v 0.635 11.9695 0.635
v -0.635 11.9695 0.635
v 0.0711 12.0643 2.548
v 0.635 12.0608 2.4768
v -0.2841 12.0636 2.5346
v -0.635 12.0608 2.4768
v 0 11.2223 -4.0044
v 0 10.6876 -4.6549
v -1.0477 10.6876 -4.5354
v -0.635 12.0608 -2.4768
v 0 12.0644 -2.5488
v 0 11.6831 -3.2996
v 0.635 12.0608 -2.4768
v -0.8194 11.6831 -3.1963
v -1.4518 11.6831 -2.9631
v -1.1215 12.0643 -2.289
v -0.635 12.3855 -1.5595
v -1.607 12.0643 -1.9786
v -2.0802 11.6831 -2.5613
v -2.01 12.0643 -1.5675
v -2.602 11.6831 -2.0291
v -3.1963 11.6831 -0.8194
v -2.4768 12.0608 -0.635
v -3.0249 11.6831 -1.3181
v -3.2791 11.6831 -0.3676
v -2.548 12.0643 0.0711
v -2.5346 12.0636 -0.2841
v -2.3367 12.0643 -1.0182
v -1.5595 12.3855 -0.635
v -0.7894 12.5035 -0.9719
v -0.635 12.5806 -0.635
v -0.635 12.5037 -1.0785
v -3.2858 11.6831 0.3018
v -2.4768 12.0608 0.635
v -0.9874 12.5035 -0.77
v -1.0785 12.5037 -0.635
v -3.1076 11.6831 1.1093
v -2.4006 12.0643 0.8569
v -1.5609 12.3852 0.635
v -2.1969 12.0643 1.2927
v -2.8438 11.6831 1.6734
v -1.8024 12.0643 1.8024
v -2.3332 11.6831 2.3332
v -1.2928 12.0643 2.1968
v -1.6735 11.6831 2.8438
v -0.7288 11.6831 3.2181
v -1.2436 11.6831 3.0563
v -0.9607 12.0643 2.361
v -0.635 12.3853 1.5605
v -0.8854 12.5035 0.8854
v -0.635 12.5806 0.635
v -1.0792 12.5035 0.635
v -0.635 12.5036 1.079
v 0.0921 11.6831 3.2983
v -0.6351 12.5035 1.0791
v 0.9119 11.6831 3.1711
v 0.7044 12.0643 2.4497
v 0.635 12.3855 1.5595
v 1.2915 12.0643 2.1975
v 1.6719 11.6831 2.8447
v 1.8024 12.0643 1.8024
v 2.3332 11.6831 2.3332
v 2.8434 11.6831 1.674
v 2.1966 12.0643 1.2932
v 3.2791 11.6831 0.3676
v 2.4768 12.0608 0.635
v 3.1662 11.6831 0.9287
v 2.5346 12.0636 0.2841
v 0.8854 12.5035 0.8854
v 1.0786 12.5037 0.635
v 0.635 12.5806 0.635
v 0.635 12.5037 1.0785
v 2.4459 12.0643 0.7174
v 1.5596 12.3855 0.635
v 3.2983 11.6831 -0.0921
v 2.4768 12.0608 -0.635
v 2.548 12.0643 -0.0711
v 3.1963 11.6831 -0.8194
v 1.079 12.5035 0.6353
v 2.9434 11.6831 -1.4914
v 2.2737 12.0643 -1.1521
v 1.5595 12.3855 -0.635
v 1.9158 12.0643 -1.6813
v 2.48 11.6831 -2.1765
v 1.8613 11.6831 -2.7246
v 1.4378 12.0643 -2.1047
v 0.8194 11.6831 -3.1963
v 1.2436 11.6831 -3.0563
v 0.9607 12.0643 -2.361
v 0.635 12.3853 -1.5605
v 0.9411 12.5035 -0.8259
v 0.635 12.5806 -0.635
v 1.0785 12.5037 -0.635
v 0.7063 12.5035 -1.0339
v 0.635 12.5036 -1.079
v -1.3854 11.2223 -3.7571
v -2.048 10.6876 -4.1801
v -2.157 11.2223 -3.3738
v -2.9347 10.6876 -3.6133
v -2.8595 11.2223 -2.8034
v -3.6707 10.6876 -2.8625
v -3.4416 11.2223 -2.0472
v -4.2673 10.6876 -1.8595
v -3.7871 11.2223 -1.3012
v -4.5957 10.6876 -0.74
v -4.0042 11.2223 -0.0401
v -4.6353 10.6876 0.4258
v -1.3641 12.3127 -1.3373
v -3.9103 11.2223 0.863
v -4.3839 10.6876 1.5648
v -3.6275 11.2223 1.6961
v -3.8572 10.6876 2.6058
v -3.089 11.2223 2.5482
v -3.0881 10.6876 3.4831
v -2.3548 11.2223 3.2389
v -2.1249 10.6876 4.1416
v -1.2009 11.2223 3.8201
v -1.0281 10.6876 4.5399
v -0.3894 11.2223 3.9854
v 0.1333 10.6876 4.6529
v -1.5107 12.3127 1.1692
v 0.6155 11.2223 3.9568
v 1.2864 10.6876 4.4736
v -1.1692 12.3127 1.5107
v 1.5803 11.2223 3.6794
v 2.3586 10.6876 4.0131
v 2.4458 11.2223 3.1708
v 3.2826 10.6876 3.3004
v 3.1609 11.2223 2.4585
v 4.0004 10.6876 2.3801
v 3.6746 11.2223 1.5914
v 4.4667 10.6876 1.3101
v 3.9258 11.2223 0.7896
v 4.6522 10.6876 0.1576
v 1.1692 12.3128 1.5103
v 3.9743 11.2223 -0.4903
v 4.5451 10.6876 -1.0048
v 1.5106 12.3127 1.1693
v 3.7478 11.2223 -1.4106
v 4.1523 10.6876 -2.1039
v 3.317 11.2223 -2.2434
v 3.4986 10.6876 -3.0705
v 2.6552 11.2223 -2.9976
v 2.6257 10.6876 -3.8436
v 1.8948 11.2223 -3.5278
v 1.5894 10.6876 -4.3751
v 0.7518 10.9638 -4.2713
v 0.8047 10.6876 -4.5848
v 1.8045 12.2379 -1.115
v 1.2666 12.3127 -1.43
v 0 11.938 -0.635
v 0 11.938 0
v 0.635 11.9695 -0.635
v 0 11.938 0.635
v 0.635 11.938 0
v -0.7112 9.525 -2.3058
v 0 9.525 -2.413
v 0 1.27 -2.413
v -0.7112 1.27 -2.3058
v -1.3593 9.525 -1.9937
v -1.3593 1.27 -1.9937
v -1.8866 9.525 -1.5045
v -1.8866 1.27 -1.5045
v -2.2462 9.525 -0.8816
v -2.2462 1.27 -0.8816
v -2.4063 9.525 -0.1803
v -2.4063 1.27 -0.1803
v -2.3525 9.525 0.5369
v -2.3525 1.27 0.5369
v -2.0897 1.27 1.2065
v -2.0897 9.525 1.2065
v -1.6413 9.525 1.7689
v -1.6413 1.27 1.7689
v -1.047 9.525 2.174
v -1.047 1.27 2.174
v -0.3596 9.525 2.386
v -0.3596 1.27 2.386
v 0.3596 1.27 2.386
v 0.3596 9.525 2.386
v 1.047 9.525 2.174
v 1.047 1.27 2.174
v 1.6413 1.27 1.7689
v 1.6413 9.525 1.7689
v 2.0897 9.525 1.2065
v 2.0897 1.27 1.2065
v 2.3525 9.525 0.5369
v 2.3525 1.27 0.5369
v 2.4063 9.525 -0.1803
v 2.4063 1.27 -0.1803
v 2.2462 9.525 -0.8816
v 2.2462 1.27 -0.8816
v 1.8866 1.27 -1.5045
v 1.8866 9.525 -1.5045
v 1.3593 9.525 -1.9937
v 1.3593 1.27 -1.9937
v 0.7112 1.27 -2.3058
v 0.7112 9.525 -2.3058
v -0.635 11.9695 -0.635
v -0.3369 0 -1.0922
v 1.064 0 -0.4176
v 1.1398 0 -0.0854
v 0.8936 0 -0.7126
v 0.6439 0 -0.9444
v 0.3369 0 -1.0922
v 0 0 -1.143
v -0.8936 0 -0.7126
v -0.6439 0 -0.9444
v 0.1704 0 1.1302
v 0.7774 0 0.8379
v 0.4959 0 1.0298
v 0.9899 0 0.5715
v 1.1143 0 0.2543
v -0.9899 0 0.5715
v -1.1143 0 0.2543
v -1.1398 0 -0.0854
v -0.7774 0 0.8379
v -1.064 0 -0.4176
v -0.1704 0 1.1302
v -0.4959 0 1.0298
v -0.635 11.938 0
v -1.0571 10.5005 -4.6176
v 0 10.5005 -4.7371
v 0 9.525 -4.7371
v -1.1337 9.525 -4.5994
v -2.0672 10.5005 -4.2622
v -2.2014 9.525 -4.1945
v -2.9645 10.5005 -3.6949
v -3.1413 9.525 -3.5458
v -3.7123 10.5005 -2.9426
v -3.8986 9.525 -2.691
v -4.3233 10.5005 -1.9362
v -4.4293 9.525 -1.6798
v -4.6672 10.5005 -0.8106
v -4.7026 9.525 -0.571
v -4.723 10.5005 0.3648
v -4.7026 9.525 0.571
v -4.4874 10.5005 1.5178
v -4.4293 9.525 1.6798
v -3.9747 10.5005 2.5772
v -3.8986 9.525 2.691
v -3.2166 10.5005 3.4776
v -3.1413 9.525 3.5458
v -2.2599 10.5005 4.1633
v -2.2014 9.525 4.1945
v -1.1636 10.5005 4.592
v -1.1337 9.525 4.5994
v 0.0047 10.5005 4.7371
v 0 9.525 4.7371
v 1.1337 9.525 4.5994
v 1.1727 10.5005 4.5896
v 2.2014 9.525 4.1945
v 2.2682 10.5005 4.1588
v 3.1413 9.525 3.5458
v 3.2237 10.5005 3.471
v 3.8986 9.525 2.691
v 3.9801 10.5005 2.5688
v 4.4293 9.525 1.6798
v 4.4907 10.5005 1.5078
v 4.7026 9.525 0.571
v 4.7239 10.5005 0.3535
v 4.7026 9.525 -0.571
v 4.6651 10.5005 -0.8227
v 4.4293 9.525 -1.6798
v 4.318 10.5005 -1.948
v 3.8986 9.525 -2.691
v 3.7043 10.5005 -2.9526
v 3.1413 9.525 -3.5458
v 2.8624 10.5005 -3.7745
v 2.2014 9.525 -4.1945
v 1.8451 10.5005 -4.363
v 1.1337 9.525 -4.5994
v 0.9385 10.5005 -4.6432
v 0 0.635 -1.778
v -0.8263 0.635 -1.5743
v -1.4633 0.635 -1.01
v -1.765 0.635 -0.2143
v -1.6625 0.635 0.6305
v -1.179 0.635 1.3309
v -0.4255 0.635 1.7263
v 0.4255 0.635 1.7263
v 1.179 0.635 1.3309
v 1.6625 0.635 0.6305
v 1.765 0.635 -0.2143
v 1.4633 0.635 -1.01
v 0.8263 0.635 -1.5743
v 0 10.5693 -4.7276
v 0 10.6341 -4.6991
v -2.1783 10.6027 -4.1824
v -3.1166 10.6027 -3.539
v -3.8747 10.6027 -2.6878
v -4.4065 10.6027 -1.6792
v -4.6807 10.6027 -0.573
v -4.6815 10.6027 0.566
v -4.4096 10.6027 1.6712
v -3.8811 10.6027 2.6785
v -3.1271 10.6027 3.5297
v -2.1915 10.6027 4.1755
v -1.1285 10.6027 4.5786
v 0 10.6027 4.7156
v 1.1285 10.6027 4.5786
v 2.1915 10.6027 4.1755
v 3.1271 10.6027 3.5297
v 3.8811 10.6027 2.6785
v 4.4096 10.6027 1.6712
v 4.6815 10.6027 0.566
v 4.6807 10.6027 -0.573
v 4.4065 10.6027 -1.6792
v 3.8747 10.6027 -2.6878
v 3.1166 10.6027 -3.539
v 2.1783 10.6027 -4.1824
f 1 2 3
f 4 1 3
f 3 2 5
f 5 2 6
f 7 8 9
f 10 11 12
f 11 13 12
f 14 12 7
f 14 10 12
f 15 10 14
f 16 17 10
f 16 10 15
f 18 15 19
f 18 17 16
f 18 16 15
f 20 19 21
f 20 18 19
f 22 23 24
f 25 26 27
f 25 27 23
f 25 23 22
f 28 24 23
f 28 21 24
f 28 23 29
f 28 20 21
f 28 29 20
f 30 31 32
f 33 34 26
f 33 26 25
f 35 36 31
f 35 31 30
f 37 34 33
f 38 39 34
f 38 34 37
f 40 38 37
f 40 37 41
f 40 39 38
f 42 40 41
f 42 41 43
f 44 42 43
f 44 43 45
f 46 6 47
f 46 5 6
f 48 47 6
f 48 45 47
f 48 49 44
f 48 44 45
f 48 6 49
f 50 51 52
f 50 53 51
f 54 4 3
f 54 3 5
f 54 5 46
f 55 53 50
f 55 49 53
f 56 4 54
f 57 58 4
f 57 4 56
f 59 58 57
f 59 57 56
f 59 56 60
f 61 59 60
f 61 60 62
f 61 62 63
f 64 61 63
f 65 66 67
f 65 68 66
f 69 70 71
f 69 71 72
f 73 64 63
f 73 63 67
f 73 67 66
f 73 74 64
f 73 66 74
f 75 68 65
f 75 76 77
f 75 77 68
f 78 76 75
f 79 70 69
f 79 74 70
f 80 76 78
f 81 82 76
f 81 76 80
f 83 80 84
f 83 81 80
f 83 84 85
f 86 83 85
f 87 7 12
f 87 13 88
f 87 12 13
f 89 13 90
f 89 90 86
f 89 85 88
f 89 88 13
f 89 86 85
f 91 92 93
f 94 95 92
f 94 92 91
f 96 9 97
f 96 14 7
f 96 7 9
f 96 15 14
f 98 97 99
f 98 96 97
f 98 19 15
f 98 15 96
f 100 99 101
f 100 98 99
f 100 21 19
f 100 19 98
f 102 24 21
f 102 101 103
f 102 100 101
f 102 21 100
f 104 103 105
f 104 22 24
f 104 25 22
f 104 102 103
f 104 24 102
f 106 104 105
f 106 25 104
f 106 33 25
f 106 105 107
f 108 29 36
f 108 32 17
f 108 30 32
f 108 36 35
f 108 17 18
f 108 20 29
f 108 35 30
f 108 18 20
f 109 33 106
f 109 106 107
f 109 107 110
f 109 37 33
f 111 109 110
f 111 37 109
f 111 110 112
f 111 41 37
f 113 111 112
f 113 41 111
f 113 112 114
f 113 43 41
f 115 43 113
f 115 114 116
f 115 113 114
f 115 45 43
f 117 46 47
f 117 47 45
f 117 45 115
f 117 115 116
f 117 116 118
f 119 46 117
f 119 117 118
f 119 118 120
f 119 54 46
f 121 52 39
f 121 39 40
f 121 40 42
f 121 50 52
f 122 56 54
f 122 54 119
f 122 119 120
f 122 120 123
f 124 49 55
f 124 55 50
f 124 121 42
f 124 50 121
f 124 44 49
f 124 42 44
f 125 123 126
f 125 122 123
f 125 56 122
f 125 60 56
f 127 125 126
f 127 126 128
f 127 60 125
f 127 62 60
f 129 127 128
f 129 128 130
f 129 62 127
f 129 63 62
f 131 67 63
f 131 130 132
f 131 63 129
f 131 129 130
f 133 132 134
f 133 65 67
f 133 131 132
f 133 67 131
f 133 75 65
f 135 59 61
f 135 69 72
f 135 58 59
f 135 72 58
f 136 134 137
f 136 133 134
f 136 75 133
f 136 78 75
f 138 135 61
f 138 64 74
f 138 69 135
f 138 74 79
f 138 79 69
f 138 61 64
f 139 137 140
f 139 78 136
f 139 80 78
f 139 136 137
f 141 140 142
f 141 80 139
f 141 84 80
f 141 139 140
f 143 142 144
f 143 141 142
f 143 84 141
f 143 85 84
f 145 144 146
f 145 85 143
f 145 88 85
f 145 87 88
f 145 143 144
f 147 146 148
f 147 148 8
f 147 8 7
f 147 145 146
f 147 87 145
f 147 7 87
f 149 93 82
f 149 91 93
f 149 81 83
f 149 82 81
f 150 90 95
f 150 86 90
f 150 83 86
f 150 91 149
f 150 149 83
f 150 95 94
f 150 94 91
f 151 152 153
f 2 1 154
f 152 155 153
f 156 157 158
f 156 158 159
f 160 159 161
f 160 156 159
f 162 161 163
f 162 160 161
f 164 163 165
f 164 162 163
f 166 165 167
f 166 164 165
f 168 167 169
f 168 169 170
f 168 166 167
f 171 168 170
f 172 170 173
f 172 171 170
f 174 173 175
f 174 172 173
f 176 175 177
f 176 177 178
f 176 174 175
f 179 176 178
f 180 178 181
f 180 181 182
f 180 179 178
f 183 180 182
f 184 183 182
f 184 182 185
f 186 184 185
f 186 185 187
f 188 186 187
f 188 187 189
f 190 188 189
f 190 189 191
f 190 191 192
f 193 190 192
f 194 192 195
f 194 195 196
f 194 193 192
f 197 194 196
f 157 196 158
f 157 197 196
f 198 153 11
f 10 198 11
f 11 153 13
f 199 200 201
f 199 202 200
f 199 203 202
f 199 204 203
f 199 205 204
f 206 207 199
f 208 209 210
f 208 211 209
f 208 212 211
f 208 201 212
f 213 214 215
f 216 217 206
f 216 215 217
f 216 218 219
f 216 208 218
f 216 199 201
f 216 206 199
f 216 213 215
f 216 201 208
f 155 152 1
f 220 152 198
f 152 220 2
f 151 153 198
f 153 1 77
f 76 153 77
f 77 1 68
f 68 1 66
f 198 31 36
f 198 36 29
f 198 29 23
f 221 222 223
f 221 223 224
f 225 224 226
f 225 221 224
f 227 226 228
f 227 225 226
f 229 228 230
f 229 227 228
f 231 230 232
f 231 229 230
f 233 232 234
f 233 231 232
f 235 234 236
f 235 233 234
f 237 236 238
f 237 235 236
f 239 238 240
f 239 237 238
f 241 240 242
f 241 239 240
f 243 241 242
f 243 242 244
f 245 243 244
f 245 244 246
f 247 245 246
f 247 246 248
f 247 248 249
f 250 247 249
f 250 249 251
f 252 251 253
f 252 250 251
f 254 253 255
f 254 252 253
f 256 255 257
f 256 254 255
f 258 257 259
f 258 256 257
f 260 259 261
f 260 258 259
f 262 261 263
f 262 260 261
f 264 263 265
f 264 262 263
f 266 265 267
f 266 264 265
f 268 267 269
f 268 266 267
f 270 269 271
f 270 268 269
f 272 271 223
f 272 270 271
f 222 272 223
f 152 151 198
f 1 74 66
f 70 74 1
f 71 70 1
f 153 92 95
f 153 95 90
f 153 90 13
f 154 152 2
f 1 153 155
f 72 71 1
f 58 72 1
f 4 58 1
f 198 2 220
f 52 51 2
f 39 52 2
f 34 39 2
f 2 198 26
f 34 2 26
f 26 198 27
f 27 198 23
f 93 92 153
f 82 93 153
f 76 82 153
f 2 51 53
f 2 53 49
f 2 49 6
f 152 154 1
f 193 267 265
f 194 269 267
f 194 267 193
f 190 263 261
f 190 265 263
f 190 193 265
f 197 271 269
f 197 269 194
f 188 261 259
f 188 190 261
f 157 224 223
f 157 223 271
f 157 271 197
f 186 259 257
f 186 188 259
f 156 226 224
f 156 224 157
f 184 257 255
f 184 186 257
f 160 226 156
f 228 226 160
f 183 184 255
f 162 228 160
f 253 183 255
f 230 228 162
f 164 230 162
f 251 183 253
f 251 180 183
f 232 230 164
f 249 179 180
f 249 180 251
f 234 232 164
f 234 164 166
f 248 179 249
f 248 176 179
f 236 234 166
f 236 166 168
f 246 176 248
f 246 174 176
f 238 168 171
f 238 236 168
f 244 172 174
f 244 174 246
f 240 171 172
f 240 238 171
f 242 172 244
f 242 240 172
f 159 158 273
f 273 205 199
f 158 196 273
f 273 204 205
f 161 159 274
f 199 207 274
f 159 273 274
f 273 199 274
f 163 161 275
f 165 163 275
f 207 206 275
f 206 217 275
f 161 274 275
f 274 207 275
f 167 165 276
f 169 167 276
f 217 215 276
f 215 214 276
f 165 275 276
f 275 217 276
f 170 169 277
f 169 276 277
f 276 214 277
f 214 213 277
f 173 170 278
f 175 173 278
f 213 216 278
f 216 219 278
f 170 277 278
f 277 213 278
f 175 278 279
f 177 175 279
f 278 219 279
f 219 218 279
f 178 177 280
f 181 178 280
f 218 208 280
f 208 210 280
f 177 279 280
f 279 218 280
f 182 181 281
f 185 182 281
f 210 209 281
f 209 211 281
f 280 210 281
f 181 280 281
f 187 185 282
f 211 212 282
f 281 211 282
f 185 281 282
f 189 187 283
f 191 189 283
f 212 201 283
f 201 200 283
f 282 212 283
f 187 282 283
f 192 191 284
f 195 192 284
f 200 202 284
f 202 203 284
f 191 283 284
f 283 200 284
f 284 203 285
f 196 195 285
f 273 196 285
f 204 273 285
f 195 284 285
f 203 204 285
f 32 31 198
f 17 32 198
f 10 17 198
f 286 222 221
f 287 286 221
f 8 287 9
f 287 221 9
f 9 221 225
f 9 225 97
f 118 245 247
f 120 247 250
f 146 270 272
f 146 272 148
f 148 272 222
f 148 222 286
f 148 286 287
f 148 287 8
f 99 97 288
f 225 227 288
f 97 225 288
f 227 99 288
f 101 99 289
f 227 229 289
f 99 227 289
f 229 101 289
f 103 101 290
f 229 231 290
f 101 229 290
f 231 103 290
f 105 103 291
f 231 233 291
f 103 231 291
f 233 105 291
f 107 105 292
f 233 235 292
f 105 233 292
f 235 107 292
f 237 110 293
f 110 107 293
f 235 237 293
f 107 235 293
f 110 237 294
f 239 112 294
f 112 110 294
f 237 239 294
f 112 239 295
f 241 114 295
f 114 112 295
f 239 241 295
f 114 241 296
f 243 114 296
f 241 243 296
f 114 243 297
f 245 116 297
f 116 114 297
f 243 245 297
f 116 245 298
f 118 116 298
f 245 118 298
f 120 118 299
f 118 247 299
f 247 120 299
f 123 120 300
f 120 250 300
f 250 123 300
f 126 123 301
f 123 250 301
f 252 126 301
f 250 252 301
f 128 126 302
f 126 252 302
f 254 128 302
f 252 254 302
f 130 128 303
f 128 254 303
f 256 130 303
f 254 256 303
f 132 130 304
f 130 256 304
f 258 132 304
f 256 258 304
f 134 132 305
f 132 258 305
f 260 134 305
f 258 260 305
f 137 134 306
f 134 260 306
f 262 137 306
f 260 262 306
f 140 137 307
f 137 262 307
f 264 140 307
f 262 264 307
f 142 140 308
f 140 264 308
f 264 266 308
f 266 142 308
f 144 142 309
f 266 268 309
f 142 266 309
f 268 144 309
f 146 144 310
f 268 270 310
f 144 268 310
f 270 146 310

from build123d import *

# Parameters (mm, degrees)
BOSS_EXTRUDE1_DEPTH = 0.635
CIRPATTERN1_COUNT   = 4
FILLET1_R           = 0.254
CHAMFER1_SIZE       = 1.27


with BuildPart() as part:
    # Sketch1 → Revolve1 (revolve)
    with BuildSketch(Plane.XY, mode=Mode.PRIVATE) as revolve1_sk:
        with BuildLine():
            Line((0, 0), (2.413, 0))
            Line((2.413, 0), (2.413, 9.525))
            Line((2.413, 9.525), (4.7371, 9.525))
            Line((4.7371, 9.525), (4.7371, 10.611002179))
            ThreePointArc((4.7371, 10.611002179), (2.548848552, 12.064353728), (0, 12.7))
            Line((0, 12.7), (0, 0))
        make_face()
    revolve(revolve1_sk.sketch.rotate(Axis((0, 0, 0), (0, 1, 0)), 90), axis=Axis((0, 0, 0), (0, 1, 0)))

    # Sketch2 → Boss-Extrude1 (cut, symmetric)
    with BuildSketch(Plane.XY):
        with BuildLine():
            Line((0, 12.7), (0, 11.938))
            Line((0, 11.938), (2.548848552, 12.064353728))
            ThreePointArc((2.548848552, 12.064353728), (1.301653808, 12.491363305), (0, 12.7))
        make_face()
    boss_extrude1 = extrude(amount=BOSS_EXTRUDE1_DEPTH, both=True, mode=Mode.SUBTRACT)

    # CirPattern1: Boss-Extrude1 ×4 about axis
    cirpattern1_axis = Axis((0, 0, 0), (0, 1, 0))
    for i in range(1, CIRPATTERN1_COUNT):
        add(boss_extrude1.rotate(cirpattern1_axis, i * 360 / CIRPATTERN1_COUNT), mode=Mode.SUBTRACT)

    # Fillet1
    fillet1_edges = [part.edges().sort_by_distance(p)[0] for p in [
        (0, 10.611002179, 4.7371),
    ]]
    fillet(fillet1_edges, radius=FILLET1_R)

    # Chamfer1
    chamfer1_edges = [part.edges().sort_by_distance(p)[0] for p in [
        (0, 0, 2.413),
    ]]
    chamfer(chamfer1_edges, length=CHAMFER1_SIZE)


solid = part.part
